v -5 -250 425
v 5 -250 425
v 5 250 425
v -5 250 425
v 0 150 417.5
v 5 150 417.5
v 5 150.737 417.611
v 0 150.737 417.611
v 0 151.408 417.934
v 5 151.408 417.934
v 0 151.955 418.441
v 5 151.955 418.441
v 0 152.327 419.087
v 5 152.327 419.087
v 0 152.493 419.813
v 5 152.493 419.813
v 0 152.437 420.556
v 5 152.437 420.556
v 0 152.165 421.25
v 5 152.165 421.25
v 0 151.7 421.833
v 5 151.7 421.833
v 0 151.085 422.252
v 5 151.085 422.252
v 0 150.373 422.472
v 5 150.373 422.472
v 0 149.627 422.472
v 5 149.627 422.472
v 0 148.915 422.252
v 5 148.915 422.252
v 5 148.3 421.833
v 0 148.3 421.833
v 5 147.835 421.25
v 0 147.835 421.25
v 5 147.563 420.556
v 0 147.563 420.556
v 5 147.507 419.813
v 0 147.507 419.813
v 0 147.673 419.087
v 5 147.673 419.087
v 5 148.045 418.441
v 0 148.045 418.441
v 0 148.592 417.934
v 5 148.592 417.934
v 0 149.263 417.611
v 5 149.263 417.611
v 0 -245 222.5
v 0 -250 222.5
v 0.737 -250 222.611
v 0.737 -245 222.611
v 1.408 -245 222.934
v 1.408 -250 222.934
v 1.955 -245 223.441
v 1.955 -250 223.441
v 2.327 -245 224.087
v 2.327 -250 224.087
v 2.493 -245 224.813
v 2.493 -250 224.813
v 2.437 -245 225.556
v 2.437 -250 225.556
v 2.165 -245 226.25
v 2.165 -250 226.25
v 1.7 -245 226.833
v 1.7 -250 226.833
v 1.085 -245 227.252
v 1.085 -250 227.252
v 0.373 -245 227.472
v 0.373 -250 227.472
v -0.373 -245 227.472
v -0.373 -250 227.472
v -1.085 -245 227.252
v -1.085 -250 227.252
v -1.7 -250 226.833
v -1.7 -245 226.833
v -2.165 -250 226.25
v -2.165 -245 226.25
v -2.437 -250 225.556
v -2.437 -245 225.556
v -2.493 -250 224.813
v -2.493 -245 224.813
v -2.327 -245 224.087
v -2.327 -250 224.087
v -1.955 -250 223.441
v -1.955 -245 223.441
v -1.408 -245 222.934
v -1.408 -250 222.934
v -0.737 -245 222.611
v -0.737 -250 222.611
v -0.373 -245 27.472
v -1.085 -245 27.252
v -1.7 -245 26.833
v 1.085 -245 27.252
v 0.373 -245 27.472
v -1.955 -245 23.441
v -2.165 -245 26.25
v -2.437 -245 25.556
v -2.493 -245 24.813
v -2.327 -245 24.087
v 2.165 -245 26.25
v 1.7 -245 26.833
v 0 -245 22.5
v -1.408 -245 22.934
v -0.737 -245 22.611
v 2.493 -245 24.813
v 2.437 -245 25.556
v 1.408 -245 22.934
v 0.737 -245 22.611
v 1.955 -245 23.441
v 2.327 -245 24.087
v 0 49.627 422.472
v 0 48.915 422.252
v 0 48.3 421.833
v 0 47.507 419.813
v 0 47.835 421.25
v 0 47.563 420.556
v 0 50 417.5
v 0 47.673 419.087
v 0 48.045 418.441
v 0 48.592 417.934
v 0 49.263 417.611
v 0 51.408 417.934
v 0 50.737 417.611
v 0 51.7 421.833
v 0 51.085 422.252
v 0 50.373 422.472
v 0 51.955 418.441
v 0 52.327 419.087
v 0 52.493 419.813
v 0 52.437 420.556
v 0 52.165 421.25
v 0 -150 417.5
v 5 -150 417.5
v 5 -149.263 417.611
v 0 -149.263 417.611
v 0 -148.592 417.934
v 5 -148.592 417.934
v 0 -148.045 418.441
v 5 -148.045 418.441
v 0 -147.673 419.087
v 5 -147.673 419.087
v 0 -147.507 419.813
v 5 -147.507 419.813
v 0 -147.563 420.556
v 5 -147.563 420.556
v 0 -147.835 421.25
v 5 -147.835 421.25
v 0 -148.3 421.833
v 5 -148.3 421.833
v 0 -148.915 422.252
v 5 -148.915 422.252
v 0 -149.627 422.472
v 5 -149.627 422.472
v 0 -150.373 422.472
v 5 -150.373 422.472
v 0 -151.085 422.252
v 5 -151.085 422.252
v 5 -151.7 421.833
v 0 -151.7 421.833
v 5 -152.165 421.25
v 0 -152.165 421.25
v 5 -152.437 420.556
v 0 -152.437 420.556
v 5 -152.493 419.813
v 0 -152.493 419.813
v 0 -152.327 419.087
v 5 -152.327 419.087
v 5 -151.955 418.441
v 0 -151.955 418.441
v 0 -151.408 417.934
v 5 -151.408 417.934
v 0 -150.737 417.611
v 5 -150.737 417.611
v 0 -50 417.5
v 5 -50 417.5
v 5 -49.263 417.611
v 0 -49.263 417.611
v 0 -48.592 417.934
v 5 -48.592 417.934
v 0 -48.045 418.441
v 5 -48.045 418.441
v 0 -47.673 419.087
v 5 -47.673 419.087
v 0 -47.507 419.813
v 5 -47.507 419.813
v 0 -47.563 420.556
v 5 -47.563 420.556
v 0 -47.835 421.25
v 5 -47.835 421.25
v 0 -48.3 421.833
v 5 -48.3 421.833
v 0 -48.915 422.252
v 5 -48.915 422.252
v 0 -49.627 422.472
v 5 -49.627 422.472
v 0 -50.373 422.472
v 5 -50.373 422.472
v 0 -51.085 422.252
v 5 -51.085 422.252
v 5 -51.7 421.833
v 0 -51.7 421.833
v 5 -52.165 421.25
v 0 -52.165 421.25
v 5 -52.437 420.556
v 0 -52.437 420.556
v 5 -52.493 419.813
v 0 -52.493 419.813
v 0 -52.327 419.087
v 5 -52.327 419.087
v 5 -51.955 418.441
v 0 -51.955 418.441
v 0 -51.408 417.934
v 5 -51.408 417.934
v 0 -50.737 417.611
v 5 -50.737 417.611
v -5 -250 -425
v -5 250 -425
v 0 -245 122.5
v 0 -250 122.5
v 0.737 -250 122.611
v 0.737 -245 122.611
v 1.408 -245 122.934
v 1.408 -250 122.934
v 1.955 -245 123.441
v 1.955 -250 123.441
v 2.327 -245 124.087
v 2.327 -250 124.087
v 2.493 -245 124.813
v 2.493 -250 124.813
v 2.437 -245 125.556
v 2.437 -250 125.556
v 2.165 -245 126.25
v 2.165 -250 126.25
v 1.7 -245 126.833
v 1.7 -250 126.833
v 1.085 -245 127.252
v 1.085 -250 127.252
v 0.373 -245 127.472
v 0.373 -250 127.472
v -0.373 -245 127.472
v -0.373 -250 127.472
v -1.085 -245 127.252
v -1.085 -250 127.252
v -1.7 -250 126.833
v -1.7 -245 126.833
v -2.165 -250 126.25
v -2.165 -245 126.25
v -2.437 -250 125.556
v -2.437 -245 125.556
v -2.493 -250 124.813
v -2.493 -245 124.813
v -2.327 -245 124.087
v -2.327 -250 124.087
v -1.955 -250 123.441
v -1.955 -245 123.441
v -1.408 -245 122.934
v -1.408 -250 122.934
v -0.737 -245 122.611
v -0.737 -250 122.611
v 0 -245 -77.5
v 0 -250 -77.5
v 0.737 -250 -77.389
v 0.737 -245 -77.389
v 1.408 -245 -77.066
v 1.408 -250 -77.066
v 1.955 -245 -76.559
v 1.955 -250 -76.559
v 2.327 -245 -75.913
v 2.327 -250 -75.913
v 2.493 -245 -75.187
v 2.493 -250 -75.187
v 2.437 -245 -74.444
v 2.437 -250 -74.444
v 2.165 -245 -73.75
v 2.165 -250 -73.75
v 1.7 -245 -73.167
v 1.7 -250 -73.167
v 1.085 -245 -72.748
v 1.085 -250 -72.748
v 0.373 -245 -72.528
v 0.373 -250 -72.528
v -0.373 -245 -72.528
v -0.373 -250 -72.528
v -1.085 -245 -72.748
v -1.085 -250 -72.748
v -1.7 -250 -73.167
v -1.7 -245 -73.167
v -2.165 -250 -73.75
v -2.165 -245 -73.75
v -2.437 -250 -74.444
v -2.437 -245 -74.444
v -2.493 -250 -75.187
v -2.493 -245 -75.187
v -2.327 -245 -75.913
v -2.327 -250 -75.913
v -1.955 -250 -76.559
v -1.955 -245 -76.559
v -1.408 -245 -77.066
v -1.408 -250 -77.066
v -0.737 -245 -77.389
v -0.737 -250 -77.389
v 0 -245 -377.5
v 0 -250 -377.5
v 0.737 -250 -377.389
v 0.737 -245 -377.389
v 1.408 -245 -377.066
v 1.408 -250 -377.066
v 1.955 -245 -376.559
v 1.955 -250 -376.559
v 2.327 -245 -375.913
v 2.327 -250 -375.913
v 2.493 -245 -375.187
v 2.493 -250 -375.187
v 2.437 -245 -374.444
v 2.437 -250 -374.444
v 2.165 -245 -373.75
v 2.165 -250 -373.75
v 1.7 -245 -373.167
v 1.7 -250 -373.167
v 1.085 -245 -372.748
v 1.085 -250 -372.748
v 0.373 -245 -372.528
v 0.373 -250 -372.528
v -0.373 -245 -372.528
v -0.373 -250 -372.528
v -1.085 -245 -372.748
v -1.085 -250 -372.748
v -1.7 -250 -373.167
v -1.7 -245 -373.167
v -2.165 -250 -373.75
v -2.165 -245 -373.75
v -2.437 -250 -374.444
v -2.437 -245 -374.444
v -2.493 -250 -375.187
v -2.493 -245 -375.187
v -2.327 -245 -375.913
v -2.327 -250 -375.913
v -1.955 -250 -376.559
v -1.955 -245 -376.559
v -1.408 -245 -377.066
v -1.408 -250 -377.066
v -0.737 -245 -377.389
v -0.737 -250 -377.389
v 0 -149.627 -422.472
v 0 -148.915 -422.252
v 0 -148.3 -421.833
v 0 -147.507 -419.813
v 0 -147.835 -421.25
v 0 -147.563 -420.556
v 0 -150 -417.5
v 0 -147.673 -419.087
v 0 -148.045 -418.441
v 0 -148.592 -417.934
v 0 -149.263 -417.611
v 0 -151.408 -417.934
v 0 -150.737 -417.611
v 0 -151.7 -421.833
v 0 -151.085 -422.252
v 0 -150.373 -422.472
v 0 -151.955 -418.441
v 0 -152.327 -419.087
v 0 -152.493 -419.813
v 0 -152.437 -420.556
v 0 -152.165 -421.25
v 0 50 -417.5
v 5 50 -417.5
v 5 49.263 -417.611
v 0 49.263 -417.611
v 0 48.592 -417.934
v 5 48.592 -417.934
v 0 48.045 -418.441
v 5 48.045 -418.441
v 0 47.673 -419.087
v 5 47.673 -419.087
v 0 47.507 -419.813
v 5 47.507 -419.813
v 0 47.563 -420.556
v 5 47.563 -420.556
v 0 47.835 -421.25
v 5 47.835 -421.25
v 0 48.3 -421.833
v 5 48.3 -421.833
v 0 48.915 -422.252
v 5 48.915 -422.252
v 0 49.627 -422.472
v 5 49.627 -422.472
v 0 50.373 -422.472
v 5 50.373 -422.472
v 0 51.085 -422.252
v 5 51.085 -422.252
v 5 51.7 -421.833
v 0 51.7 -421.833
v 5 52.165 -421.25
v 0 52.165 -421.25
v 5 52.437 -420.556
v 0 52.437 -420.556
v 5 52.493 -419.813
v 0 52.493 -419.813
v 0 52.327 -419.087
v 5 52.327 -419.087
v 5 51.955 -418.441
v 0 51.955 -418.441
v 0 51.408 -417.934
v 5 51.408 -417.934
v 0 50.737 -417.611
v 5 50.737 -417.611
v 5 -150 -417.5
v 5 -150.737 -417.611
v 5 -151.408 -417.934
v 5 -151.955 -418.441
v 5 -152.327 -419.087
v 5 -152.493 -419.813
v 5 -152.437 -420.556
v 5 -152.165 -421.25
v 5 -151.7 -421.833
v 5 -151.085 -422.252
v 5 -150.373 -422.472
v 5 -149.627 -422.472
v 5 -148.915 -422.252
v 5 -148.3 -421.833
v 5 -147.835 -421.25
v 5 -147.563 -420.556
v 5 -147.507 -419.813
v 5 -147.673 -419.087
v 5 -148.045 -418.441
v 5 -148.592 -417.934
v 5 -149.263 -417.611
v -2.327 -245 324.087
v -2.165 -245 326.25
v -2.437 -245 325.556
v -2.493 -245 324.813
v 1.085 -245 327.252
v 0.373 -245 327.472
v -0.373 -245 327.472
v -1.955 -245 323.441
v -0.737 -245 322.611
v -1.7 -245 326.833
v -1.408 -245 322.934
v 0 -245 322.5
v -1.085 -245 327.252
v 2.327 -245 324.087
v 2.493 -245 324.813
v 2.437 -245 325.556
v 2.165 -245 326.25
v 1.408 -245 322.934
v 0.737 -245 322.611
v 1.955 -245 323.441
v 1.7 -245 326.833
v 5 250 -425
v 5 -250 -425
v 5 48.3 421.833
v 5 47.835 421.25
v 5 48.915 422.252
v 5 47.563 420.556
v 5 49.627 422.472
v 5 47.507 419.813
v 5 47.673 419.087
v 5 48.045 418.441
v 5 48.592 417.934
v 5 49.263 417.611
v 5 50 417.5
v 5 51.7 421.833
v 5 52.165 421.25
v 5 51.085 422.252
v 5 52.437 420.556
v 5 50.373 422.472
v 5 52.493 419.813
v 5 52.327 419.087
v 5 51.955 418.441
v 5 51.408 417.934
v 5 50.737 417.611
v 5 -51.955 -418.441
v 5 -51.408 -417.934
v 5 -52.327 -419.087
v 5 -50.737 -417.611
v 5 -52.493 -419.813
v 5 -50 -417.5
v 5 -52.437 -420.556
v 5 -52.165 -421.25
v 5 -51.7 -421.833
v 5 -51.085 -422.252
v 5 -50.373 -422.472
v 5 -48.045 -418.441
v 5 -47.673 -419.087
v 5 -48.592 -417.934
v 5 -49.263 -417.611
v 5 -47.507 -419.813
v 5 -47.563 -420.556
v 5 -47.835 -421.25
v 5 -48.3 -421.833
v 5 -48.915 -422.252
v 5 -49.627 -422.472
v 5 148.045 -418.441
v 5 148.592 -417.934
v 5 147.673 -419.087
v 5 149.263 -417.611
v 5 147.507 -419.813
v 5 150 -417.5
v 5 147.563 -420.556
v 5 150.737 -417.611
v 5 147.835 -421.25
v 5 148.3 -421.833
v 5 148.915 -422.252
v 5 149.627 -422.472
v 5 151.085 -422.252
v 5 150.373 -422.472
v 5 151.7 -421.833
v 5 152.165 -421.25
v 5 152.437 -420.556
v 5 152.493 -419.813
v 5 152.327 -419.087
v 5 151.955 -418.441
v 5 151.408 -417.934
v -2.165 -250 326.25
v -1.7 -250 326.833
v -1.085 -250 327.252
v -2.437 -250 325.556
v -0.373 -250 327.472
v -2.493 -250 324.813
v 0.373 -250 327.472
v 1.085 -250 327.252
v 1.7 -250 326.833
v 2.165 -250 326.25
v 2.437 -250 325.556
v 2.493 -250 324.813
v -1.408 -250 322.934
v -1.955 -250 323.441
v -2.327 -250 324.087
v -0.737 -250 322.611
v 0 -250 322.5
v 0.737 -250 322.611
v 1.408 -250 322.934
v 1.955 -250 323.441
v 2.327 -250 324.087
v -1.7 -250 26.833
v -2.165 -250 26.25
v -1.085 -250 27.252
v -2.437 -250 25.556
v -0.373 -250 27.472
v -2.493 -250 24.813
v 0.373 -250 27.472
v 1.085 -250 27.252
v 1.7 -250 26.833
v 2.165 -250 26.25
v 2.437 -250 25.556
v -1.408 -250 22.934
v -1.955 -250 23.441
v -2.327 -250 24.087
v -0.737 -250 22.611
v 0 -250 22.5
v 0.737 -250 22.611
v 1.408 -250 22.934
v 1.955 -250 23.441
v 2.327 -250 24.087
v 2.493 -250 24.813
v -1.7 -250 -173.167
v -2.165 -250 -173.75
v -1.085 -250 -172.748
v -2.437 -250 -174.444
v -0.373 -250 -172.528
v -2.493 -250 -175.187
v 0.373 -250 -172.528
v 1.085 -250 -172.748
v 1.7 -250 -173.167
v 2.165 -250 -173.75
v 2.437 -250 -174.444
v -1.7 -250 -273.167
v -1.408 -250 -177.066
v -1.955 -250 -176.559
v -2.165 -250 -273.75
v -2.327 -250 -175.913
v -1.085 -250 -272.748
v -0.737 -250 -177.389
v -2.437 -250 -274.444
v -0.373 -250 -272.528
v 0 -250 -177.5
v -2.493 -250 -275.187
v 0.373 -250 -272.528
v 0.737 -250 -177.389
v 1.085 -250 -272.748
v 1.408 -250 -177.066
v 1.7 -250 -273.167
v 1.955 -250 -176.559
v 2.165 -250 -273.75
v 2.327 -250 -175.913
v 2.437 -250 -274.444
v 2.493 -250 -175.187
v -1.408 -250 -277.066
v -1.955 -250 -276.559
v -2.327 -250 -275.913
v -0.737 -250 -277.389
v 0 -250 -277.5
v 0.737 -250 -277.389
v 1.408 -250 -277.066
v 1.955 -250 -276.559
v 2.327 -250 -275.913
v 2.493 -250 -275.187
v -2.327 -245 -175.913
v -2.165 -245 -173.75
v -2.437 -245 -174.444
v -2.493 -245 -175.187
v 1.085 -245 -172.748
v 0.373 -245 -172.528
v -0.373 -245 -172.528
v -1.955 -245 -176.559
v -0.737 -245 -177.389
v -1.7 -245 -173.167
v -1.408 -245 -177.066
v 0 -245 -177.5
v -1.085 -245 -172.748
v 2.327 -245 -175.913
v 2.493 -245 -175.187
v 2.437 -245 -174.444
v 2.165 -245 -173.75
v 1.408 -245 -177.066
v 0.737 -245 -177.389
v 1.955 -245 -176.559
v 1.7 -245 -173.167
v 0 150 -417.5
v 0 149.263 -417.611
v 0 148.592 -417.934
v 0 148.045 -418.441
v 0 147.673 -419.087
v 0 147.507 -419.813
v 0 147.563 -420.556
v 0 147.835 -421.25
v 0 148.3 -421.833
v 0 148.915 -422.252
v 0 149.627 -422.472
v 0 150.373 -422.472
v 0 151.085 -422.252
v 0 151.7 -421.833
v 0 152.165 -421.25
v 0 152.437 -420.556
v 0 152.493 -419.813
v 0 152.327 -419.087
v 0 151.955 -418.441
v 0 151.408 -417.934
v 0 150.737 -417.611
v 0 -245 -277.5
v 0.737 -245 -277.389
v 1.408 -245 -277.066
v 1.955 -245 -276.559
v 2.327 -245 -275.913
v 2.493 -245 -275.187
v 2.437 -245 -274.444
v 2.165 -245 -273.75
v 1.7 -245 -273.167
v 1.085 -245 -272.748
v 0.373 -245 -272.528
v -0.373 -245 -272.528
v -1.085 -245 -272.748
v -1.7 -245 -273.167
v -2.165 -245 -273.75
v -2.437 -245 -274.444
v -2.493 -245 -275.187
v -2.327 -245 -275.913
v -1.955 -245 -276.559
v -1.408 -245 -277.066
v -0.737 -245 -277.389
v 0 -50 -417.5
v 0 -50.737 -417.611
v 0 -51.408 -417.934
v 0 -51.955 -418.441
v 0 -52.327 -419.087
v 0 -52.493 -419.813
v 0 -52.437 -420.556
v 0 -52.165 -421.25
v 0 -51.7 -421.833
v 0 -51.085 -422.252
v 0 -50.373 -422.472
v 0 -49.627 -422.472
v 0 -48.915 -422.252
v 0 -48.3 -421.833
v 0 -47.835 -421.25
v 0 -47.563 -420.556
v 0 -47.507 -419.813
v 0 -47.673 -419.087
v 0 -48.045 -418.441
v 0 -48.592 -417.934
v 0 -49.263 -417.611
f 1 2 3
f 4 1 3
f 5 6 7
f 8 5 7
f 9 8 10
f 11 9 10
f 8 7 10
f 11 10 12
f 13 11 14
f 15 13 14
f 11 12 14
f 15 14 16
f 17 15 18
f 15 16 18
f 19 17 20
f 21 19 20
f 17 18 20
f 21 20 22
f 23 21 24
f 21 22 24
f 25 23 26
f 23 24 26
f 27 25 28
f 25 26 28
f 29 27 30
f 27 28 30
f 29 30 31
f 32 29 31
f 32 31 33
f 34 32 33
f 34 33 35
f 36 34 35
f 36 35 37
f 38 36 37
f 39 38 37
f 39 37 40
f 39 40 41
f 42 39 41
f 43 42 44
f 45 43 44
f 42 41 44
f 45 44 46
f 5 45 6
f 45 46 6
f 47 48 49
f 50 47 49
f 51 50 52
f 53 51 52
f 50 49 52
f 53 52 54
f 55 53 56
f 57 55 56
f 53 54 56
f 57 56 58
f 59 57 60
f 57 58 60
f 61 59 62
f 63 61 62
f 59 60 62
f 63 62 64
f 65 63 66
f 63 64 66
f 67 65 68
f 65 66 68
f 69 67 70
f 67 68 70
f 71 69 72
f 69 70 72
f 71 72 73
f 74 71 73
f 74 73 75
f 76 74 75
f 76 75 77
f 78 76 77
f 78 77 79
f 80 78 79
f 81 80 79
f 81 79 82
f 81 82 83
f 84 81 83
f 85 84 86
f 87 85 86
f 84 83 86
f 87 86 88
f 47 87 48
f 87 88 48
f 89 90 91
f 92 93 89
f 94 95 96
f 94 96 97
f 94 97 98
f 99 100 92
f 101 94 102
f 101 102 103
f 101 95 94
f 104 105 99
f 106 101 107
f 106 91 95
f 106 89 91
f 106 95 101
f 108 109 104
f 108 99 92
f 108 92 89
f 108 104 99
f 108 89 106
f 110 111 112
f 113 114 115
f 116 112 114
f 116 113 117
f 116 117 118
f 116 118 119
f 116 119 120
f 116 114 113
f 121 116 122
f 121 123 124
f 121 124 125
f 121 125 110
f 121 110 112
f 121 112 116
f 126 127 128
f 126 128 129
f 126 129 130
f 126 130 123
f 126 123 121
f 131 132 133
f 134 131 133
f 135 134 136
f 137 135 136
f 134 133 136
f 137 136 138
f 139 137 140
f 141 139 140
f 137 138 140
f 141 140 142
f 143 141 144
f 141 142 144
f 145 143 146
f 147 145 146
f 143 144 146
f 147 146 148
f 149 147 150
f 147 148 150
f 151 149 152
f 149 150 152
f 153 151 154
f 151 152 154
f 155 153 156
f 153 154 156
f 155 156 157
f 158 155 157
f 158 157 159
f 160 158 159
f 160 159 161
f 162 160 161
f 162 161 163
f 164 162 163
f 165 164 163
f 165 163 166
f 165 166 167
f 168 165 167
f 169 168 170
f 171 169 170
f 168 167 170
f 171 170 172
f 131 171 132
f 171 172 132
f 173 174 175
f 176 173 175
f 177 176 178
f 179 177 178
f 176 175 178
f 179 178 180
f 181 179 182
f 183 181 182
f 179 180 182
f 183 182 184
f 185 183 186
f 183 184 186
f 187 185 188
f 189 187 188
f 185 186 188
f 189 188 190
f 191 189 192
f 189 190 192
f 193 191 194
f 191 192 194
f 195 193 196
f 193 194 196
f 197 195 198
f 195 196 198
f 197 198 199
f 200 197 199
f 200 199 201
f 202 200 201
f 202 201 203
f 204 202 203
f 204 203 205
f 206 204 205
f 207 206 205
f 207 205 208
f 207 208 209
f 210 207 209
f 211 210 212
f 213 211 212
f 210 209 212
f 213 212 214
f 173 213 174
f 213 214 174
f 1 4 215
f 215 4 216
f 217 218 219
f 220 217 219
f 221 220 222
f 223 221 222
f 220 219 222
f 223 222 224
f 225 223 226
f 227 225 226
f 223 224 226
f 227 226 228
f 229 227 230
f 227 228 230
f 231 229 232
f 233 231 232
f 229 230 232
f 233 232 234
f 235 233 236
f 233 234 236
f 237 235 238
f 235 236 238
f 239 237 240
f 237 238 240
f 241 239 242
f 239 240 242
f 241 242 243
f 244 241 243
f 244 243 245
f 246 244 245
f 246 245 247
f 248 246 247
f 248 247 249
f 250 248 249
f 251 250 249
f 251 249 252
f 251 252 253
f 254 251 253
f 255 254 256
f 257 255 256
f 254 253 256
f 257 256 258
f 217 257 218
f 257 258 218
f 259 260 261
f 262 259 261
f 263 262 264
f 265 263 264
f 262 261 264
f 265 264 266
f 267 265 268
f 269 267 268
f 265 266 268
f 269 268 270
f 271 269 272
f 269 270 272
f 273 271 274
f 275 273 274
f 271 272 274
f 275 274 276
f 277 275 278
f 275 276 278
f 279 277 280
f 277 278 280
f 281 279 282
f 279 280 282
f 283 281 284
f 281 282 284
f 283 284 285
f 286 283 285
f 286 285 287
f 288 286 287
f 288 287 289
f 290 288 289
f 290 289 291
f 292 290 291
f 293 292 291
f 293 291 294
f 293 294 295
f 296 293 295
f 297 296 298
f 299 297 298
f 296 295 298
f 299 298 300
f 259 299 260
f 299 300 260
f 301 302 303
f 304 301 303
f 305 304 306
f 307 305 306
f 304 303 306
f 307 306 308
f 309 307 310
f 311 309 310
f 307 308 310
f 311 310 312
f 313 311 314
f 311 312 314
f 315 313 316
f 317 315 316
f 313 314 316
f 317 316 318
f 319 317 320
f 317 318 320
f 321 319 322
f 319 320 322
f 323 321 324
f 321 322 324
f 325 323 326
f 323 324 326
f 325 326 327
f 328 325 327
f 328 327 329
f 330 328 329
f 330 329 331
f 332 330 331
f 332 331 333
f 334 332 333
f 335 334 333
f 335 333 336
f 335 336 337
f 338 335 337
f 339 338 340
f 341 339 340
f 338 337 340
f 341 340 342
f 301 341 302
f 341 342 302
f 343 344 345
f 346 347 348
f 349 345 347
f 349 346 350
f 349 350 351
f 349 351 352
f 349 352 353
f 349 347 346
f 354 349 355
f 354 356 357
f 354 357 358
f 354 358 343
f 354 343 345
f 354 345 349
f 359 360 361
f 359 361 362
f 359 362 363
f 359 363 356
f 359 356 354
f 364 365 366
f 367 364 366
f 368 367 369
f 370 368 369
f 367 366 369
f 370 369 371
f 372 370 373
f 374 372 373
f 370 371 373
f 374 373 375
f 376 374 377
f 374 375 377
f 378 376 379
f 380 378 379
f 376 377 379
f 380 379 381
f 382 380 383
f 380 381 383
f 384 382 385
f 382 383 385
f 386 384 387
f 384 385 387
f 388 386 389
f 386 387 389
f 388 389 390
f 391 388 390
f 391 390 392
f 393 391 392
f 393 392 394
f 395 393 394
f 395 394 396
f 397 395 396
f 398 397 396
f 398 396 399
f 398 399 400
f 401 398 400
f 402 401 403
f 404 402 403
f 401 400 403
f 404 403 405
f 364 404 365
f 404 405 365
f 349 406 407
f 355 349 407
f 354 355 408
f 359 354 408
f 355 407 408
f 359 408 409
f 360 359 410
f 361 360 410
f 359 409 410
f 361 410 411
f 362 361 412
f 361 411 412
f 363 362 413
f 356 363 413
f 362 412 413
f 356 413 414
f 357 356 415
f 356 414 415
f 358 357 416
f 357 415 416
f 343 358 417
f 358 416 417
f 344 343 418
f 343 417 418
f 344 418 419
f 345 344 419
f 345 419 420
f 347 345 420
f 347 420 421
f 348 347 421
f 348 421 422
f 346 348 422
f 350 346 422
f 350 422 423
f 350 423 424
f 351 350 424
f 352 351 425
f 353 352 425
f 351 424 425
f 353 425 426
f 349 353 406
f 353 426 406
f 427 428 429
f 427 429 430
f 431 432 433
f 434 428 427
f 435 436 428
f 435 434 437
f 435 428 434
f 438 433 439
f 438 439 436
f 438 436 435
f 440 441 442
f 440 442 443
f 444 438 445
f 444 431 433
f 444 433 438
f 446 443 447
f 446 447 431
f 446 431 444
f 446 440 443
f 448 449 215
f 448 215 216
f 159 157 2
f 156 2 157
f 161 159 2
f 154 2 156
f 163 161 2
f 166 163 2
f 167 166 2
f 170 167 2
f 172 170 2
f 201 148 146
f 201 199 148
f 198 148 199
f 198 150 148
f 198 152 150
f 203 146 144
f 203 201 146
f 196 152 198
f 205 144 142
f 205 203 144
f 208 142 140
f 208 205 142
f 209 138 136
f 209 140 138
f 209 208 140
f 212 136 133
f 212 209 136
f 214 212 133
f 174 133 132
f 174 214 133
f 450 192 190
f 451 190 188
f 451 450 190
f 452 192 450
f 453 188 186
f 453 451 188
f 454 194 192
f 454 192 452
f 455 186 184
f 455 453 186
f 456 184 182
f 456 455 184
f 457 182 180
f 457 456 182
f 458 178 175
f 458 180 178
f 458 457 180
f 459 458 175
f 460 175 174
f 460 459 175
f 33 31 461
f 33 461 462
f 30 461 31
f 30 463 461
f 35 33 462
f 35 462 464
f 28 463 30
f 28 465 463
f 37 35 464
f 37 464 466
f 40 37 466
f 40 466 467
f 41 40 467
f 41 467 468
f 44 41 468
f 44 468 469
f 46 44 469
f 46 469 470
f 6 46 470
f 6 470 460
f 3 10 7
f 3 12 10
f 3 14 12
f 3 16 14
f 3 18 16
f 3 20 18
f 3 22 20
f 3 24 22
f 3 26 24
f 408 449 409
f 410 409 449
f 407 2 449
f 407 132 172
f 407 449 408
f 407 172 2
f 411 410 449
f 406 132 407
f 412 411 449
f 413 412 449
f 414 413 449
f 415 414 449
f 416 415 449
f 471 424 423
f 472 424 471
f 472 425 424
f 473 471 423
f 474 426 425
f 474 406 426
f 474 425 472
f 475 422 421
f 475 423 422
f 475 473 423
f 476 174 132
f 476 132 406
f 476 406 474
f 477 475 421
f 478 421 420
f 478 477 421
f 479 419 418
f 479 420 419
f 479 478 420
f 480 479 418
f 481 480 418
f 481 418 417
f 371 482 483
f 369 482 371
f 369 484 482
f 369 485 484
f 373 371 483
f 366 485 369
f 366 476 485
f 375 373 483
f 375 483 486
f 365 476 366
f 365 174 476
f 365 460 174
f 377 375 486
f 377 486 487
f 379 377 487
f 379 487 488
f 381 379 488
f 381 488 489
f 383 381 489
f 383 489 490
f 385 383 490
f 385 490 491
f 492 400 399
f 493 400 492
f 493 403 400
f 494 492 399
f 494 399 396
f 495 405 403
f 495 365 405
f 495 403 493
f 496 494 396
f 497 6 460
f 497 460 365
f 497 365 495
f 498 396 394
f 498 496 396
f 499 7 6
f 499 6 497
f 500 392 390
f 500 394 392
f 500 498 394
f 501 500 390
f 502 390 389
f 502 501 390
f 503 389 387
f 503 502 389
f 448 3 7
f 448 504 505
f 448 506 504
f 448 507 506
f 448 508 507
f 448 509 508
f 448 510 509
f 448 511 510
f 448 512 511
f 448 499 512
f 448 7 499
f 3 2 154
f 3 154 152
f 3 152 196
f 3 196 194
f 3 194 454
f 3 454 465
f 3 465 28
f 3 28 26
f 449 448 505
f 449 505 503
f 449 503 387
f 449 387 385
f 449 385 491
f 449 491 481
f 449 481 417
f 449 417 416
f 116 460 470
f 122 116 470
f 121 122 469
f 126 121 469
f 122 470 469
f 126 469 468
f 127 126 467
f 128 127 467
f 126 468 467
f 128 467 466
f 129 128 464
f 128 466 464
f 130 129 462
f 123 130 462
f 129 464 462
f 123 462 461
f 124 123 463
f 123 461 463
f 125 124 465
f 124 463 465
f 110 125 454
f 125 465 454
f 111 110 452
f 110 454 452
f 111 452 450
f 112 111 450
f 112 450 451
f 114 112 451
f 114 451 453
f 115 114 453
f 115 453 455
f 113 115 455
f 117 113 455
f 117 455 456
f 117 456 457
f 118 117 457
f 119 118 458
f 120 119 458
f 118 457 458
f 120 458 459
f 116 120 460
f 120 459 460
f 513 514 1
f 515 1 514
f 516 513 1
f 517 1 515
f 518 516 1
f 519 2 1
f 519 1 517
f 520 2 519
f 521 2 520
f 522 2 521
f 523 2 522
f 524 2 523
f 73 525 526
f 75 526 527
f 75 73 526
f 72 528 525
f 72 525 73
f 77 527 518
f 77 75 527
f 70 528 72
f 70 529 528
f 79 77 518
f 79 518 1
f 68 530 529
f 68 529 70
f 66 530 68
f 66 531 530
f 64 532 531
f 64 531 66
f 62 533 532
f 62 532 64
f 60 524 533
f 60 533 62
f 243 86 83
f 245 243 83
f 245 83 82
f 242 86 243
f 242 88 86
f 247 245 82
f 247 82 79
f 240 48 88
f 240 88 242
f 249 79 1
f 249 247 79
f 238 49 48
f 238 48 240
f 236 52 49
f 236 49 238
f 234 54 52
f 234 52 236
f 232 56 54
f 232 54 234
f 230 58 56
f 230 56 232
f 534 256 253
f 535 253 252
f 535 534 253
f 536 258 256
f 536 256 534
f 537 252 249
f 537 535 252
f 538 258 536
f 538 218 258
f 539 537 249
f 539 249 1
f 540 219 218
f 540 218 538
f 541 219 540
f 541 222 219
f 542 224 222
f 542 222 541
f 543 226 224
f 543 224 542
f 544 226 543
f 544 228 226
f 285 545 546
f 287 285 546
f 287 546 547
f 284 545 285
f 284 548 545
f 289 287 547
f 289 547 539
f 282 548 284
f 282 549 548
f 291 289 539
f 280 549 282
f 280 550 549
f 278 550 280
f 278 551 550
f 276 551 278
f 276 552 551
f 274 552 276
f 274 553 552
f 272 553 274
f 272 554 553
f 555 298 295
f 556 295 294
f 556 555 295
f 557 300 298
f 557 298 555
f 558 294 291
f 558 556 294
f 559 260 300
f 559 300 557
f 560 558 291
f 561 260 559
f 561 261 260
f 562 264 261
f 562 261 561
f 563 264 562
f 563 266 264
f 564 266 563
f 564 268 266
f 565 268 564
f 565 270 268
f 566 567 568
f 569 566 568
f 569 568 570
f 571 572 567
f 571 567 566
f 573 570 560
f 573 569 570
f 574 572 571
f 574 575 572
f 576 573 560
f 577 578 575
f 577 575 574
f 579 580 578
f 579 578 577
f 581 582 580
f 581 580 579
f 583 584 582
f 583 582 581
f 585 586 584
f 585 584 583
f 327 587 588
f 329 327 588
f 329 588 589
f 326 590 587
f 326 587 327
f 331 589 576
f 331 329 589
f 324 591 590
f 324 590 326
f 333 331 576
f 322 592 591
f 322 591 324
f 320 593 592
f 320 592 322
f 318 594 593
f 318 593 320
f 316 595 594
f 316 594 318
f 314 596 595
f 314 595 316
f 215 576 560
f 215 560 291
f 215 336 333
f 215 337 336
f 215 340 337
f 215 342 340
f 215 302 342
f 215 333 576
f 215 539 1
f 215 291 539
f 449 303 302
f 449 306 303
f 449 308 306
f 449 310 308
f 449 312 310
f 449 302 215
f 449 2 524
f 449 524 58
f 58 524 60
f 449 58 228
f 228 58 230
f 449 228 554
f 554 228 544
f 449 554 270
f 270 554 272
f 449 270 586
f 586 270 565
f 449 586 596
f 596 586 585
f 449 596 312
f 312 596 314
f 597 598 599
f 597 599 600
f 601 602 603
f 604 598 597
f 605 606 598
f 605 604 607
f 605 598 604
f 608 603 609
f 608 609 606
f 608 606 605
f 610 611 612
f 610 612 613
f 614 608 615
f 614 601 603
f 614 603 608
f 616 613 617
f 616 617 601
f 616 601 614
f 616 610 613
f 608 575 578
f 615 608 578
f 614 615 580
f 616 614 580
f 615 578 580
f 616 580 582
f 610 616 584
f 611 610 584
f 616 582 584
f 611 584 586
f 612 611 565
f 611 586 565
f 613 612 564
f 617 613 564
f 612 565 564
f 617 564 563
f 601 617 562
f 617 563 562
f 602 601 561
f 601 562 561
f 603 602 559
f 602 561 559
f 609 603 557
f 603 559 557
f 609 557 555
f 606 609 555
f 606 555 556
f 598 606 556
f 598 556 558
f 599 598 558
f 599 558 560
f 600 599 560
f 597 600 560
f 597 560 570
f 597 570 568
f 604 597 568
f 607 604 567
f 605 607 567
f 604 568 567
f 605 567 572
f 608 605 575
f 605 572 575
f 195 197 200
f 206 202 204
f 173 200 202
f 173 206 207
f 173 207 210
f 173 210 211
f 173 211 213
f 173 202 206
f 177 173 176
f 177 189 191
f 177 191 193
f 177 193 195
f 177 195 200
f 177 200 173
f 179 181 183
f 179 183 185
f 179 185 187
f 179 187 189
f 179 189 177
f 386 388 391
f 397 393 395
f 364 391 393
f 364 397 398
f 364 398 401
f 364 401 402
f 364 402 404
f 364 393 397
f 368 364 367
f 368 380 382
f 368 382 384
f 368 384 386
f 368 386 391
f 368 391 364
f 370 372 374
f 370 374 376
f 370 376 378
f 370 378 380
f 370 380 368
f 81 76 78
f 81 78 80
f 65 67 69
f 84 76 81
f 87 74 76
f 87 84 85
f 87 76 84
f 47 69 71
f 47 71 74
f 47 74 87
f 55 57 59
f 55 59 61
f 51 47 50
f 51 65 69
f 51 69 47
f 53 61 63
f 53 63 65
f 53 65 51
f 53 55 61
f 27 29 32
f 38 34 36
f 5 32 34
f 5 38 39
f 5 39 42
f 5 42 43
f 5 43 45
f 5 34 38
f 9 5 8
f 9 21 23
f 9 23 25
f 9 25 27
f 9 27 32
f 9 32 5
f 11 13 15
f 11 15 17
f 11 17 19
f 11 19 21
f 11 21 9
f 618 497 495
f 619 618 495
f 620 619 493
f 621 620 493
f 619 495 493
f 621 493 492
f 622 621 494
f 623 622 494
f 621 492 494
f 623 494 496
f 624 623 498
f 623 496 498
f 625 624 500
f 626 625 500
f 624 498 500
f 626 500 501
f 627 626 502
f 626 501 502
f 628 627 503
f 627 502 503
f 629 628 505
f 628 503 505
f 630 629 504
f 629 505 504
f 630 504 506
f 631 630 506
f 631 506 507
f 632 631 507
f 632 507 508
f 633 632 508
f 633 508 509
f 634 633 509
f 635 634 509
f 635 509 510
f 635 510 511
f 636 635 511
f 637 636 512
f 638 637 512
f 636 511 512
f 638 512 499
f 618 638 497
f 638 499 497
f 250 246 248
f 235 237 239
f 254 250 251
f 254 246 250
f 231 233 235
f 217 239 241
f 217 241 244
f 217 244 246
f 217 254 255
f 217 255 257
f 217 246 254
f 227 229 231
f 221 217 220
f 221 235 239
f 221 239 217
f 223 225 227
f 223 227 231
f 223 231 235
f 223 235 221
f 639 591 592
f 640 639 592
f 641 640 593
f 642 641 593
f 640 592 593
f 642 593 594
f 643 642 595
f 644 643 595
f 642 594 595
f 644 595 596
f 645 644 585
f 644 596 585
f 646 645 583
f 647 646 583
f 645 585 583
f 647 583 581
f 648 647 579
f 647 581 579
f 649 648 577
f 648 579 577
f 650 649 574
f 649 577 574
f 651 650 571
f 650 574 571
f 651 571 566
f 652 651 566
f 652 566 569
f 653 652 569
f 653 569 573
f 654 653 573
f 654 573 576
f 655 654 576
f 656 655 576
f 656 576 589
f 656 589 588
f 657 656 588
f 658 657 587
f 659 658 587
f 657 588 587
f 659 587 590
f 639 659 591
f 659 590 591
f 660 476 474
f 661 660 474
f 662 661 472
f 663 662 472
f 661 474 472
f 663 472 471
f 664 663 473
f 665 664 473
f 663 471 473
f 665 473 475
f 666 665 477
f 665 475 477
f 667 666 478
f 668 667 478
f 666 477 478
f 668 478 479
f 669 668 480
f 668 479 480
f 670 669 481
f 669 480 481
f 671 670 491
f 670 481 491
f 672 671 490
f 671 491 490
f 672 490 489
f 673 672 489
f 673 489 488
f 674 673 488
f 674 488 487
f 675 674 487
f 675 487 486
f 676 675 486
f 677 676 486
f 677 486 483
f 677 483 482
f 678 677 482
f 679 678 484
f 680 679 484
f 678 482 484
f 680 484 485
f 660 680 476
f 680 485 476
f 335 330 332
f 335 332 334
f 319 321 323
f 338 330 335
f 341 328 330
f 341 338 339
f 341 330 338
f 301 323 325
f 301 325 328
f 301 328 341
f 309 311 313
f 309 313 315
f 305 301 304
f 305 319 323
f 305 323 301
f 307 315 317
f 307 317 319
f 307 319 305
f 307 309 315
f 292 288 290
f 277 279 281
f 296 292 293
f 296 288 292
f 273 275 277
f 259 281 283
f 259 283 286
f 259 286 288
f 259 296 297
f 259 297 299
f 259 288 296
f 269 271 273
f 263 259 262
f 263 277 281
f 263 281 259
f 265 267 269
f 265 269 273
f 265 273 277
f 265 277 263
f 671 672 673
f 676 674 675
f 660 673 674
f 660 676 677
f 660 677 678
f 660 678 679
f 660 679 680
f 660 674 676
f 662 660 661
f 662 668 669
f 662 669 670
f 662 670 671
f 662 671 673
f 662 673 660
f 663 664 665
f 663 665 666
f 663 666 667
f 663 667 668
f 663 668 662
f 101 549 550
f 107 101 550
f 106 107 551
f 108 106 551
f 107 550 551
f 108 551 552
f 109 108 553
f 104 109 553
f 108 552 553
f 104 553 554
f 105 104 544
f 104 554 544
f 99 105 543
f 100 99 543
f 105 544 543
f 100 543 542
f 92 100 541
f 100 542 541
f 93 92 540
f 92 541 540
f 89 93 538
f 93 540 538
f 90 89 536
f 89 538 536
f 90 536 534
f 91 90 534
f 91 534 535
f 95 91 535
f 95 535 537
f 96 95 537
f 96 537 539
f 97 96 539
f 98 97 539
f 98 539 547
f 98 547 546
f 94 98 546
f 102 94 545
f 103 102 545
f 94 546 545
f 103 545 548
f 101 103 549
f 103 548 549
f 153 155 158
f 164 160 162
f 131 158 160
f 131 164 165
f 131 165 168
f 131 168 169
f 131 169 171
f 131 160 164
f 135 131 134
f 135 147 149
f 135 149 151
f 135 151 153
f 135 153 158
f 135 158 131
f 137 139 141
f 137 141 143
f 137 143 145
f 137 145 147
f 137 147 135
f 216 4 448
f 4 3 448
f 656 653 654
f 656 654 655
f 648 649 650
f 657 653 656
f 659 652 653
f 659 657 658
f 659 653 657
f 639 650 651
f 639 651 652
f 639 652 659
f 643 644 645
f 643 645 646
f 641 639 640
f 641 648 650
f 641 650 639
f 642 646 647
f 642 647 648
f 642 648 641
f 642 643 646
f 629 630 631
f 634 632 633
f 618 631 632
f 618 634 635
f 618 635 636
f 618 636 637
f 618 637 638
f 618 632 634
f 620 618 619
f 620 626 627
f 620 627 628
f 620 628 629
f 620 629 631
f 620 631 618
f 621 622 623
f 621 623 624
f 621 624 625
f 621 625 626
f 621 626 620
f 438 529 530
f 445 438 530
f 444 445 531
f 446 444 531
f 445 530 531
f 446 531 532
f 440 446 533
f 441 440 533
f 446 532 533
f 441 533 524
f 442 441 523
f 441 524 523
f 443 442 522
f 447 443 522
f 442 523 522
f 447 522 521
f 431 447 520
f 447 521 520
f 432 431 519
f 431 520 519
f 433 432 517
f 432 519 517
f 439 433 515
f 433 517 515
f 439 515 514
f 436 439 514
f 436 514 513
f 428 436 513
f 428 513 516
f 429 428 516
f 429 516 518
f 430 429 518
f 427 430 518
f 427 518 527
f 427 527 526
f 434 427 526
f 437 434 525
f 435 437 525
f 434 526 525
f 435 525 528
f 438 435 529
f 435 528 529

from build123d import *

# Parameters (mm, degrees)
CROQUIS1_W              = 850
CROQUIS1_H              = 500
SALIENTE_EXTRUIR1_DEPTH = 5
CROQUIS3_R              = 2.5
CORTAR_EXTRUIR1_DEPTH   = 5
CROQUIS5_R              = 2.5
CORTAR_EXTRUIR3_DEPTH   = 5


with BuildPart() as part:
    # Croquis1 → Saliente-Extruir1 (new, symmetric)
    with BuildSketch(Plane(origin=(0, 0, 0), x_dir=(0, 0, -1), z_dir=(1, 0, 0))):
        Rectangle(CROQUIS1_W, CROQUIS1_H)
    extrude(amount=SALIENTE_EXTRUIR1_DEPTH, both=True)

    # Croquis3 → Cortar-Extruir1 (cut)
    with BuildSketch(Plane.XZ.offset(250)):
        with Locations(Location((0, -375, 0), (0, 0, 270))):
            Circle(CROQUIS3_R)
        with Locations(Location((0, -275, 0), (0, 0, 270))):
            Circle(CROQUIS3_R)
        with Locations(Location((0, -175, 0), (0, 0, 270))):
            Circle(CROQUIS3_R)
        with Locations(Location((0, -75, 0), (0, 0, 270))):
            Circle(CROQUIS3_R)
        with Locations(Location((0, 25, 0), (0, 0, 270))):
            Circle(CROQUIS3_R)
        with Locations(Location((0, 125, 0), (0, 0, 270))):
            Circle(CROQUIS3_R)
        with Locations(Location((0, 225, 0), (0, 0, 270))):
            Circle(CROQUIS3_R)
        with Locations(Location((0, 325, 0), (0, 0, 270))):
            Circle(CROQUIS3_R)
    extrude(amount=-CORTAR_EXTRUIR1_DEPTH, mode=Mode.SUBTRACT)

    # Croquis5 → Cortar-Extruir3 (cut)
    with BuildSketch(Plane(origin=(5, 0, 0), x_dir=(0, 0, -1), z_dir=(1, 0, 0))):
        with Locations((-420, -150)):
            Circle(CROQUIS5_R)
        with Locations((-420, -50)):
            Circle(CROQUIS5_R)
        with Locations((-420, 50)):
            Circle(CROQUIS5_R)
        with Locations((-420, 150)):
            Circle(CROQUIS5_R)
        with Locations(Location((420, 150, 0), (0, 0, 180))):
            Circle(CROQUIS5_R)
        with Locations(Location((420, 50, 0), (0, 0, 180))):
            Circle(CROQUIS5_R)
        with Locations(Location((420, -50, 0), (0, 0, 180))):
            Circle(CROQUIS5_R)
        with Locations(Location((420, -150, 0), (0, 0, 180))):
            Circle(CROQUIS5_R)
    extrude(amount=-CORTAR_EXTRUIR3_DEPTH, mode=Mode.SUBTRACT)


solid = part.part
